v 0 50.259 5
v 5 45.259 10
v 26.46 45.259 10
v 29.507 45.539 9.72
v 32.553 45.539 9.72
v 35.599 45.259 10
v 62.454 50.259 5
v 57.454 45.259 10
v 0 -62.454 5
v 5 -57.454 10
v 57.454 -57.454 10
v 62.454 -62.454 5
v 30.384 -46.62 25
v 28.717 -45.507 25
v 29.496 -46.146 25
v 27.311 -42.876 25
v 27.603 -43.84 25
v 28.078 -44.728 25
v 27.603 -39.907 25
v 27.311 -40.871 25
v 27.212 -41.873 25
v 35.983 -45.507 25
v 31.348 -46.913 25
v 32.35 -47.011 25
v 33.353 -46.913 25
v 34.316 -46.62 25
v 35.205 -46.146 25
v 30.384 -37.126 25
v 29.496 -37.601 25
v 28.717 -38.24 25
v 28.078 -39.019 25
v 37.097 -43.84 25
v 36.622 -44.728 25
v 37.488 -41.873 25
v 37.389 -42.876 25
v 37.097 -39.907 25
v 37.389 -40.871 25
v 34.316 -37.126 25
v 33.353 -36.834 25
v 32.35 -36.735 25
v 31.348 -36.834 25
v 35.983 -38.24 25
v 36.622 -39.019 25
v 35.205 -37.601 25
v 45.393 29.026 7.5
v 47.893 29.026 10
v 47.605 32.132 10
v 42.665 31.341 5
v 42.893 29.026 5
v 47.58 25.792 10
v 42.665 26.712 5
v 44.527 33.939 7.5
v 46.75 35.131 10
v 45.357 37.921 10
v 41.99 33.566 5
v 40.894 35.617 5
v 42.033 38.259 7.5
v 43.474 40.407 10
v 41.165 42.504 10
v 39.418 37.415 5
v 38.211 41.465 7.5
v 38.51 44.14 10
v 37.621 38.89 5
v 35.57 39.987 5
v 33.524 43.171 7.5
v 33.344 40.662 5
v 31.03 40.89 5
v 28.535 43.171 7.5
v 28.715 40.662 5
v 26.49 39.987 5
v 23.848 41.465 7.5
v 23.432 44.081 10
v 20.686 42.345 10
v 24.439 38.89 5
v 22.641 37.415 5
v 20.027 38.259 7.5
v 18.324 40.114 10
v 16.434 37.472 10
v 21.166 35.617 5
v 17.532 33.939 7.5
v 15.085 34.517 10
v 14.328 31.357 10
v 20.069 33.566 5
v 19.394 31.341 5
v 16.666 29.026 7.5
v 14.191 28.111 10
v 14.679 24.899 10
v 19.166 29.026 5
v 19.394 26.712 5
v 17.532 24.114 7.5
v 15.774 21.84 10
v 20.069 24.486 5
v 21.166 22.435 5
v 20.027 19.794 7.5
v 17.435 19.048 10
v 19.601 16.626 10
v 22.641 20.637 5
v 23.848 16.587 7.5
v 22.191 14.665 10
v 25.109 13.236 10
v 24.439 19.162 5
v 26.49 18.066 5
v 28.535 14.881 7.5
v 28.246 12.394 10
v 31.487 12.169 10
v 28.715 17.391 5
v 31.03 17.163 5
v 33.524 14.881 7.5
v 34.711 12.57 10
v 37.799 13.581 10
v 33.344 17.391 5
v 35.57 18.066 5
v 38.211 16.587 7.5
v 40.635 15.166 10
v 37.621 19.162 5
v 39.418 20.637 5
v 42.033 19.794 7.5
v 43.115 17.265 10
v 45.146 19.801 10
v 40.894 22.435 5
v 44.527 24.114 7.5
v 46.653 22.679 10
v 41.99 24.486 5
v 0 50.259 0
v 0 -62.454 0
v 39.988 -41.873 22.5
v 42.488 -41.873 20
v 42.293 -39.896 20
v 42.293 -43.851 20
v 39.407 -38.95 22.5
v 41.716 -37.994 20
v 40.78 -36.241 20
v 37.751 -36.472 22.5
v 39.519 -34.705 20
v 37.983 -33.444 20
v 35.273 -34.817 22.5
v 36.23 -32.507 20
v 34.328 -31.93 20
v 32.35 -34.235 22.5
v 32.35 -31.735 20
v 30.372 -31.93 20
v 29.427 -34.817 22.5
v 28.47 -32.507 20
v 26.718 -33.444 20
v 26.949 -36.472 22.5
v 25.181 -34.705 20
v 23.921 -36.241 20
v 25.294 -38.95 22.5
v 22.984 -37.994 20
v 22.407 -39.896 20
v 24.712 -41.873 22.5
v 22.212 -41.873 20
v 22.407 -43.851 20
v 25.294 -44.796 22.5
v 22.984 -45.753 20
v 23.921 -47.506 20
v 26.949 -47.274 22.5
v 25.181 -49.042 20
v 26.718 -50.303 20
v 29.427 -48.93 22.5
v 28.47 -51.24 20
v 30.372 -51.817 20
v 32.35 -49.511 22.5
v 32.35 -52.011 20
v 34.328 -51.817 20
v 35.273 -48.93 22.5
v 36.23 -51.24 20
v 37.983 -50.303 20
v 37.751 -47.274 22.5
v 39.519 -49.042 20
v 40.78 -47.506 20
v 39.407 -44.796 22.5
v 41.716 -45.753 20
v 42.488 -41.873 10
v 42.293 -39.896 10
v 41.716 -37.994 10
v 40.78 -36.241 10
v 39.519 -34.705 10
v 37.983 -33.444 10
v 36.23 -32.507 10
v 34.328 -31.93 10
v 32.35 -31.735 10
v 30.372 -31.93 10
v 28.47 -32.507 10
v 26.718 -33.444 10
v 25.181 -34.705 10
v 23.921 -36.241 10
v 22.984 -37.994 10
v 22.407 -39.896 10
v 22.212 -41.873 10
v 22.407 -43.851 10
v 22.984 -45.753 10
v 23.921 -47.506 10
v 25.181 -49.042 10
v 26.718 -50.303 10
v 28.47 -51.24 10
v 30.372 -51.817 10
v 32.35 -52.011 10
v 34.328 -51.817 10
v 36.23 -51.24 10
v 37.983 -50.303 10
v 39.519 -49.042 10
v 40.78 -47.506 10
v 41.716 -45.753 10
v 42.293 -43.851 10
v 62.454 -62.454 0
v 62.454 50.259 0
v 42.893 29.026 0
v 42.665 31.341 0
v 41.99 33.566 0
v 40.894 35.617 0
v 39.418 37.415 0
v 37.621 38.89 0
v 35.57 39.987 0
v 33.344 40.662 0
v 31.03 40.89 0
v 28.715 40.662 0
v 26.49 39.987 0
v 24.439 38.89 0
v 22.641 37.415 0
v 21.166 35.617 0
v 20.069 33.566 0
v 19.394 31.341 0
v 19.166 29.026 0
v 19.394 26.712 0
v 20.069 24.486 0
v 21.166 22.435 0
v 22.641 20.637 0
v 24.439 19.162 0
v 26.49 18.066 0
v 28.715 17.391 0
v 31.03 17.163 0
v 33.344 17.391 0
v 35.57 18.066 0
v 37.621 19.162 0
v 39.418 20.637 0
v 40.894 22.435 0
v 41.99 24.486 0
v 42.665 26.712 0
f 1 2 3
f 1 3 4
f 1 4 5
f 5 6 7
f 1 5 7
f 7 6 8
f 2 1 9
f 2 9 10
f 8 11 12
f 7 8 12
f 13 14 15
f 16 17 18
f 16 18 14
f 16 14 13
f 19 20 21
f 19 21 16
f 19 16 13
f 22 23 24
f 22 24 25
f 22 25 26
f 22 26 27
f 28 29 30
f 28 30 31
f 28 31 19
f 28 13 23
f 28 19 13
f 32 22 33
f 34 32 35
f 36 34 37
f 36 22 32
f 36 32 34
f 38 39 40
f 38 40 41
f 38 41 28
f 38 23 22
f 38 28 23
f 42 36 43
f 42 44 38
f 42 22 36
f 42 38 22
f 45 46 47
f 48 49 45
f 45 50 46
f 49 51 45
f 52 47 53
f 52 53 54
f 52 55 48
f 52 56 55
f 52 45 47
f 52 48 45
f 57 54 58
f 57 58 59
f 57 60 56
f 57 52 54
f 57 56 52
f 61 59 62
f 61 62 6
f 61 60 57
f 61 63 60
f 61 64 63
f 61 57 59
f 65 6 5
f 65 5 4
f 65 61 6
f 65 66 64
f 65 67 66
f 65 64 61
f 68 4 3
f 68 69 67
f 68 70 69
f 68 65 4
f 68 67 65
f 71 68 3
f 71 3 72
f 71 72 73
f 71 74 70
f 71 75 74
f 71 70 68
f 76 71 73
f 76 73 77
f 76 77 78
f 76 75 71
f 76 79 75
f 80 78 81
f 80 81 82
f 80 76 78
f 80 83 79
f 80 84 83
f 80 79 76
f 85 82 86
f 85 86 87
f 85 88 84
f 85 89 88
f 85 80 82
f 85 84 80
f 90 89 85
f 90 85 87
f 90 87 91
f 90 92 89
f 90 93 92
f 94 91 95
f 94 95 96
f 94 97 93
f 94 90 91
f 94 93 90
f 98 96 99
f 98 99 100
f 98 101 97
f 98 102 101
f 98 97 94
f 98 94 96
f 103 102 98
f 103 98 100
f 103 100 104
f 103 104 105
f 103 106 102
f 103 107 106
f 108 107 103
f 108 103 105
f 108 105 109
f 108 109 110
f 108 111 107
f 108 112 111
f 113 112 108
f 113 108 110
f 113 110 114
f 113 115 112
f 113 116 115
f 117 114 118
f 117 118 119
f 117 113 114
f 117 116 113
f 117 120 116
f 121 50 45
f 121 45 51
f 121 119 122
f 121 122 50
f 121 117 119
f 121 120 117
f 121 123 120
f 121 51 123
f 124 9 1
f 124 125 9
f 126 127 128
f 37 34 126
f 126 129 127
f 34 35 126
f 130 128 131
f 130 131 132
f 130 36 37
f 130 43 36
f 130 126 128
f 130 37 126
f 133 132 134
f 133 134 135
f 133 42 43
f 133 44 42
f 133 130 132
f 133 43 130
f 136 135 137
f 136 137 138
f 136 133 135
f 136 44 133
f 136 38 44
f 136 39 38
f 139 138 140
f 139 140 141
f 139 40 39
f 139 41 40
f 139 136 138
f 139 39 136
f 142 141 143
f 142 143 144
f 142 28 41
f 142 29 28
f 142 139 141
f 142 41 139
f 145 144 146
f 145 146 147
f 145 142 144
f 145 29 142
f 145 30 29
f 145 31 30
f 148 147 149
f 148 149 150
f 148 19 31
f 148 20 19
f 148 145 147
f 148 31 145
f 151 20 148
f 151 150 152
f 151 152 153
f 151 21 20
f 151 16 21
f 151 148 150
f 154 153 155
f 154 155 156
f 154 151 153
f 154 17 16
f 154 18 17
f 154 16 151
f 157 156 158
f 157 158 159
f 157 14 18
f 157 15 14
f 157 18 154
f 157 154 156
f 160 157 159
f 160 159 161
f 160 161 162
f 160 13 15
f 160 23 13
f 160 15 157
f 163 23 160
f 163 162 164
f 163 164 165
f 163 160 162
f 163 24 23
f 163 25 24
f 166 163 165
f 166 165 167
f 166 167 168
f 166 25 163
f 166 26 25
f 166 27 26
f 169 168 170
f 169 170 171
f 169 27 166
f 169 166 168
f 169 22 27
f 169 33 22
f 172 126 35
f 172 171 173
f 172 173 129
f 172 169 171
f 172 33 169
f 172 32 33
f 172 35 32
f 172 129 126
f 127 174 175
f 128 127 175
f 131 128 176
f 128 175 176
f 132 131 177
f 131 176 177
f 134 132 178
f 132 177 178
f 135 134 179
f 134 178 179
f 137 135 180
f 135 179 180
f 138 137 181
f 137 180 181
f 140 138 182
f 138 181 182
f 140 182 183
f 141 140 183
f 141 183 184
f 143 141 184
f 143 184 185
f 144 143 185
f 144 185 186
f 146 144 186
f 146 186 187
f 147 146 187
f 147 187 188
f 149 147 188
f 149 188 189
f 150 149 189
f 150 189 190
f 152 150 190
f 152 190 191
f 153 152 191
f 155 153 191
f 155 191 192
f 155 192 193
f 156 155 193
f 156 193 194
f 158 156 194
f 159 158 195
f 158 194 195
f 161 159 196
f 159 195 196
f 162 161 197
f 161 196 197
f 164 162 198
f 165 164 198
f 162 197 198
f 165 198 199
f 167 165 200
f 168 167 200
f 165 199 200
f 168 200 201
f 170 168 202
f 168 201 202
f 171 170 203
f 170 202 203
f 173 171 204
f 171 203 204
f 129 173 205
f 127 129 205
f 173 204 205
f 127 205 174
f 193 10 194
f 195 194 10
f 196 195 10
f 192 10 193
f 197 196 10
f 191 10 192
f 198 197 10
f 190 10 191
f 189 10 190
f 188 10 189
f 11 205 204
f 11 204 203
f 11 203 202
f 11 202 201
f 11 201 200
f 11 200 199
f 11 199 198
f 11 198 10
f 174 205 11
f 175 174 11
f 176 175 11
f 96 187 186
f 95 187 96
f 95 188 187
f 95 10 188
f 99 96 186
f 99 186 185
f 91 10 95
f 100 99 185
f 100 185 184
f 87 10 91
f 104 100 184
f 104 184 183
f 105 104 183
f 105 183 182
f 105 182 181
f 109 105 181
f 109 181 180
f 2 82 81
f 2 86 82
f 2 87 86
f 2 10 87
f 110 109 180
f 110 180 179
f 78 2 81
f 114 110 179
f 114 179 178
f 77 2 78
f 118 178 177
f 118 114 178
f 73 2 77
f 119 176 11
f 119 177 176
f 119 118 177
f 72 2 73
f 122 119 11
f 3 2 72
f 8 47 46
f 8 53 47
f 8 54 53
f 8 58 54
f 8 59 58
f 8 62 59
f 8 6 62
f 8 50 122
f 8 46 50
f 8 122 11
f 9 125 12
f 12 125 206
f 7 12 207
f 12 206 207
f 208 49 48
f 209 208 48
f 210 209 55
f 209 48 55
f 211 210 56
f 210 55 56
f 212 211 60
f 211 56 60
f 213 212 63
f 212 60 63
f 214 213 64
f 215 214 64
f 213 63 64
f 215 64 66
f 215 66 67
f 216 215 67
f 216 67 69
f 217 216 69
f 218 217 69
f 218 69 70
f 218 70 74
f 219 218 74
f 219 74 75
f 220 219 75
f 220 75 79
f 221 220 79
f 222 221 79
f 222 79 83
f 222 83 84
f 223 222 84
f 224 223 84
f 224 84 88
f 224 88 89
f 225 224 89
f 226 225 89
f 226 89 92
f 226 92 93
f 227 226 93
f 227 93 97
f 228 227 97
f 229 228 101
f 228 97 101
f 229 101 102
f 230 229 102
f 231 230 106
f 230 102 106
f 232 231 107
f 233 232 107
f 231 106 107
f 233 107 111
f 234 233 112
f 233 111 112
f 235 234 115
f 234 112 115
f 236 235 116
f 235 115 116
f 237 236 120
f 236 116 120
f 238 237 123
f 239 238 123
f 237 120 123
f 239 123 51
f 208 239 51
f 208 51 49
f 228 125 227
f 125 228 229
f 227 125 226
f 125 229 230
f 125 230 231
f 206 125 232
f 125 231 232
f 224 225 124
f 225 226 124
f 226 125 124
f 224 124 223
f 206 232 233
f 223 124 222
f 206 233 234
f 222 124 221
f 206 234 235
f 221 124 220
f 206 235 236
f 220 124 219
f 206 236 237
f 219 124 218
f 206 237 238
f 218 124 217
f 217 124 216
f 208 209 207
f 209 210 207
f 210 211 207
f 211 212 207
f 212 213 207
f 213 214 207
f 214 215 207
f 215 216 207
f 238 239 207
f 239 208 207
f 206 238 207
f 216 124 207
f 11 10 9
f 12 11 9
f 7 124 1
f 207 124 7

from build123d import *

# Parameters (mm, degrees)
F0_W         = 62.4540001154
F0_H         = 112.7128452063
F1_DEPTH     = 10
F3_R         = 11.8634694321
F4_DEPTH     = 25
F6_R         = 10.1380548027
F7_DEPTH     = 25
F9_SIZE      = 5
F10_T1_DEPTH = 133.4296750859
F10_T3_DEPTH = 88.1708299951


# Not quite as in the source:
# - a fillet or chamfer that OpenCascade refuses, or shapes differently, is made with other operations: its cross-section is extruded or revolved along the edge and cut away or added


with BuildPart() as f1:
    # F0 (on Top) → F1 (new body)
    with BuildSketch(Plane.XY):
        with Locations((31.2270000577, -6.0975924134)):
            Rectangle(F0_W, F0_H)
    extrude(amount=F1_DEPTH)

    # F3 (on face) → F4 (cut)
    with BuildSketch(Plane.XY.offset(10)):
        with Locations((31.0296863317, 29.0262252092)):
            Circle(F3_R)
    extrude(amount=-F4_DEPTH, mode=Mode.SUBTRACT)

    # F6 (on Top) → F7 (join)
    with BuildSketch(Plane.XY):
        with Locations((32.3501564562, -41.873395443)):
            Circle(F6_R)
    extrude(amount=F7_DEPTH)

    # F9
    f9_edges = [f1.edges().sort_by_distance(p)[0] for p in [
        (31.227, 50.25883, 10),
    ]]
    chamfer(f9_edges, length=F9_SIZE)

    # F10: chamfer of 5 on 5 edges, made by hand

    # F10_s2 → F10_t1 (cut)
    with BuildSketch(Plane.XZ.offset(-58.1172451295)):
        Polygon((57.4540001154, 10), (62.4540001154, 5), (62.4540001154, 10), align=None)
        Polygon((0, 5), (5, 10), (0, 10), align=None)
    extrude(amount=F10_T1_DEPTH, mode=Mode.SUBTRACT)

    # F10_s4 → F10_t3 (cut)
    with BuildSketch(Plane.YZ.offset(-12.8584149398)):
        Polygon((-57.4540150166, 10), (-62.4540150166, 5), (-62.4540150166, 10), align=None)
    extrude(amount=F10_T3_DEPTH, mode=Mode.SUBTRACT)

    # F10_s5 → F10_t6 (revolve, cut)
    with BuildSketch(Plane.XZ.offset(41.873395443)):
        Polygon((42.488211259, 20), (37.488211259, 25), (42.488211259, 25), align=None)
    revolve(axis=Axis((32.3501564562, -41.873395443, 25), (0, 0, 1)), mode=Mode.SUBTRACT)

    # F10_s7 → F10_t8 (revolve, cut)
    with BuildSketch(Plane.XZ.offset(-29.0262252092)):
        Polygon((47.8931557638, 10), (42.8931557638, 5), (42.8931557638, 10), align=None)
    revolve(axis=Axis((31.0296863317, 29.0262252092, 10), (0, 0, 1)), mode=Mode.SUBTRACT)


solid = f1.part
